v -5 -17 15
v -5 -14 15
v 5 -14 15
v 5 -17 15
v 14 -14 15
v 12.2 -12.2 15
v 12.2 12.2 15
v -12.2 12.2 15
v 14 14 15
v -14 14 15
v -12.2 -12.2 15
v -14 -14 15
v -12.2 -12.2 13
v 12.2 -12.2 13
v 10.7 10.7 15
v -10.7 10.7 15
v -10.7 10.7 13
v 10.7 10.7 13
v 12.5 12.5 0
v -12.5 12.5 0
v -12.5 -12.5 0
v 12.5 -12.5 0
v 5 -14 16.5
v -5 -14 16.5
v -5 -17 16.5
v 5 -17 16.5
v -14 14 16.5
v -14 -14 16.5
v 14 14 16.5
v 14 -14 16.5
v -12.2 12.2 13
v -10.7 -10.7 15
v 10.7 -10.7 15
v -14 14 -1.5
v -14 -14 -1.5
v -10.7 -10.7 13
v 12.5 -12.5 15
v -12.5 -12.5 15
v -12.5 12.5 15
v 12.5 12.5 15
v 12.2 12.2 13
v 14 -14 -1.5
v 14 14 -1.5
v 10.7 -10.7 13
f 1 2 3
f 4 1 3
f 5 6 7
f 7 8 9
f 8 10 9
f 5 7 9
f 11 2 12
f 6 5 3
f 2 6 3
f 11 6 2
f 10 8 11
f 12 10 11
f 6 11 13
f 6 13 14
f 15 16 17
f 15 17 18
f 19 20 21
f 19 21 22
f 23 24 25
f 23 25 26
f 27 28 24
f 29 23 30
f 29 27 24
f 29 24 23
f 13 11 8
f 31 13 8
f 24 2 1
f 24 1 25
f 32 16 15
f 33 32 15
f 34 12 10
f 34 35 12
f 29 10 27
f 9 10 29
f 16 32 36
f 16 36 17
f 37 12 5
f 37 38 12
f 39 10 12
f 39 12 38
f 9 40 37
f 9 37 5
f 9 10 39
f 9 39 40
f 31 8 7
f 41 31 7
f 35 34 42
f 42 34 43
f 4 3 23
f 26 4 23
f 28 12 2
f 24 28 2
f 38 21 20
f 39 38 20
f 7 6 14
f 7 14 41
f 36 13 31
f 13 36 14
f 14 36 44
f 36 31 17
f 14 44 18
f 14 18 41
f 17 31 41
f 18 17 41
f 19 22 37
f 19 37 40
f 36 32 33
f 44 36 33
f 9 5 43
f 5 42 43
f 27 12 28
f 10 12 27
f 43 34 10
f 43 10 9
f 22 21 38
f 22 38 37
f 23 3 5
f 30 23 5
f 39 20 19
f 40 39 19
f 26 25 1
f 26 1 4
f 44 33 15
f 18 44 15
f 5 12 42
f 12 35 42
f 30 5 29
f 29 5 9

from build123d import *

# Parameters (mm, degrees)
F0_W     = 28
F0_H     = 28
F0_W_2   = 25
F0_H_2   = 25
F1_DEPTH = 1.5
F2_DEPTH = 15
F3_W     = 24.4
F3_H     = 24.4
F3_W_2   = 21.4
F3_H_2   = 21.4
F4_DEPTH = 2
F3_W_3   = 28
F3_H_3   = 28
F3_W_4   = 25
F3_H_4   = 25
F5_DEPTH = 1.5
F6_W     = 10
F6_H     = 1.5
F7_DEPTH = 3


with BuildPart() as f1:
    # F0 (on Top) → F1 (new body)
    with BuildSketch(Plane.XY):
        Rectangle(F0_W, F0_H)
        Rectangle(F0_W_2, F0_H_2, mode=Mode.SUBTRACT)
        Rectangle(F0_W_2, F0_H_2)
    extrude(amount=-F1_DEPTH)

    # F0 (on Top) → F2 (join)
    with BuildSketch(Plane.XY):
        Rectangle(F0_W, F0_H)
        Rectangle(F0_W_2, F0_H_2, mode=Mode.SUBTRACT)
    extrude(amount=F2_DEPTH)


with BuildPart() as f4:
    # F3 (on face) → F4 (new body)
    with BuildSketch(Plane.XY.offset(15)):
        Rectangle(F3_W, F3_H)
        Rectangle(F3_W_2, F3_H_2, mode=Mode.SUBTRACT)
    extrude(amount=-F4_DEPTH)

    # F3 (on face) → F5 (join)
    with BuildSketch(Plane.XY.offset(15)):
        Rectangle(F3_W_3, F3_H_3)
        Rectangle(F3_W_4, F3_H_4, mode=Mode.SUBTRACT)
        Rectangle(F3_W_4, F3_H_4)
        Rectangle(F3_W, F3_H, mode=Mode.SUBTRACT)
        Rectangle(F3_W, F3_H)
        Rectangle(F3_W_2, F3_H_2, mode=Mode.SUBTRACT)
        Rectangle(F3_W_2, F3_H_2)
    extrude(amount=F5_DEPTH)

    # F6 (on face) → F7 (join)
    with BuildSketch(Plane.XZ.offset(14)):
        with Locations((0, 15.75)):
            Rectangle(F6_W, F6_H)
    extrude(amount=F7_DEPTH)


solid = Compound([f1.part, f4.part])
